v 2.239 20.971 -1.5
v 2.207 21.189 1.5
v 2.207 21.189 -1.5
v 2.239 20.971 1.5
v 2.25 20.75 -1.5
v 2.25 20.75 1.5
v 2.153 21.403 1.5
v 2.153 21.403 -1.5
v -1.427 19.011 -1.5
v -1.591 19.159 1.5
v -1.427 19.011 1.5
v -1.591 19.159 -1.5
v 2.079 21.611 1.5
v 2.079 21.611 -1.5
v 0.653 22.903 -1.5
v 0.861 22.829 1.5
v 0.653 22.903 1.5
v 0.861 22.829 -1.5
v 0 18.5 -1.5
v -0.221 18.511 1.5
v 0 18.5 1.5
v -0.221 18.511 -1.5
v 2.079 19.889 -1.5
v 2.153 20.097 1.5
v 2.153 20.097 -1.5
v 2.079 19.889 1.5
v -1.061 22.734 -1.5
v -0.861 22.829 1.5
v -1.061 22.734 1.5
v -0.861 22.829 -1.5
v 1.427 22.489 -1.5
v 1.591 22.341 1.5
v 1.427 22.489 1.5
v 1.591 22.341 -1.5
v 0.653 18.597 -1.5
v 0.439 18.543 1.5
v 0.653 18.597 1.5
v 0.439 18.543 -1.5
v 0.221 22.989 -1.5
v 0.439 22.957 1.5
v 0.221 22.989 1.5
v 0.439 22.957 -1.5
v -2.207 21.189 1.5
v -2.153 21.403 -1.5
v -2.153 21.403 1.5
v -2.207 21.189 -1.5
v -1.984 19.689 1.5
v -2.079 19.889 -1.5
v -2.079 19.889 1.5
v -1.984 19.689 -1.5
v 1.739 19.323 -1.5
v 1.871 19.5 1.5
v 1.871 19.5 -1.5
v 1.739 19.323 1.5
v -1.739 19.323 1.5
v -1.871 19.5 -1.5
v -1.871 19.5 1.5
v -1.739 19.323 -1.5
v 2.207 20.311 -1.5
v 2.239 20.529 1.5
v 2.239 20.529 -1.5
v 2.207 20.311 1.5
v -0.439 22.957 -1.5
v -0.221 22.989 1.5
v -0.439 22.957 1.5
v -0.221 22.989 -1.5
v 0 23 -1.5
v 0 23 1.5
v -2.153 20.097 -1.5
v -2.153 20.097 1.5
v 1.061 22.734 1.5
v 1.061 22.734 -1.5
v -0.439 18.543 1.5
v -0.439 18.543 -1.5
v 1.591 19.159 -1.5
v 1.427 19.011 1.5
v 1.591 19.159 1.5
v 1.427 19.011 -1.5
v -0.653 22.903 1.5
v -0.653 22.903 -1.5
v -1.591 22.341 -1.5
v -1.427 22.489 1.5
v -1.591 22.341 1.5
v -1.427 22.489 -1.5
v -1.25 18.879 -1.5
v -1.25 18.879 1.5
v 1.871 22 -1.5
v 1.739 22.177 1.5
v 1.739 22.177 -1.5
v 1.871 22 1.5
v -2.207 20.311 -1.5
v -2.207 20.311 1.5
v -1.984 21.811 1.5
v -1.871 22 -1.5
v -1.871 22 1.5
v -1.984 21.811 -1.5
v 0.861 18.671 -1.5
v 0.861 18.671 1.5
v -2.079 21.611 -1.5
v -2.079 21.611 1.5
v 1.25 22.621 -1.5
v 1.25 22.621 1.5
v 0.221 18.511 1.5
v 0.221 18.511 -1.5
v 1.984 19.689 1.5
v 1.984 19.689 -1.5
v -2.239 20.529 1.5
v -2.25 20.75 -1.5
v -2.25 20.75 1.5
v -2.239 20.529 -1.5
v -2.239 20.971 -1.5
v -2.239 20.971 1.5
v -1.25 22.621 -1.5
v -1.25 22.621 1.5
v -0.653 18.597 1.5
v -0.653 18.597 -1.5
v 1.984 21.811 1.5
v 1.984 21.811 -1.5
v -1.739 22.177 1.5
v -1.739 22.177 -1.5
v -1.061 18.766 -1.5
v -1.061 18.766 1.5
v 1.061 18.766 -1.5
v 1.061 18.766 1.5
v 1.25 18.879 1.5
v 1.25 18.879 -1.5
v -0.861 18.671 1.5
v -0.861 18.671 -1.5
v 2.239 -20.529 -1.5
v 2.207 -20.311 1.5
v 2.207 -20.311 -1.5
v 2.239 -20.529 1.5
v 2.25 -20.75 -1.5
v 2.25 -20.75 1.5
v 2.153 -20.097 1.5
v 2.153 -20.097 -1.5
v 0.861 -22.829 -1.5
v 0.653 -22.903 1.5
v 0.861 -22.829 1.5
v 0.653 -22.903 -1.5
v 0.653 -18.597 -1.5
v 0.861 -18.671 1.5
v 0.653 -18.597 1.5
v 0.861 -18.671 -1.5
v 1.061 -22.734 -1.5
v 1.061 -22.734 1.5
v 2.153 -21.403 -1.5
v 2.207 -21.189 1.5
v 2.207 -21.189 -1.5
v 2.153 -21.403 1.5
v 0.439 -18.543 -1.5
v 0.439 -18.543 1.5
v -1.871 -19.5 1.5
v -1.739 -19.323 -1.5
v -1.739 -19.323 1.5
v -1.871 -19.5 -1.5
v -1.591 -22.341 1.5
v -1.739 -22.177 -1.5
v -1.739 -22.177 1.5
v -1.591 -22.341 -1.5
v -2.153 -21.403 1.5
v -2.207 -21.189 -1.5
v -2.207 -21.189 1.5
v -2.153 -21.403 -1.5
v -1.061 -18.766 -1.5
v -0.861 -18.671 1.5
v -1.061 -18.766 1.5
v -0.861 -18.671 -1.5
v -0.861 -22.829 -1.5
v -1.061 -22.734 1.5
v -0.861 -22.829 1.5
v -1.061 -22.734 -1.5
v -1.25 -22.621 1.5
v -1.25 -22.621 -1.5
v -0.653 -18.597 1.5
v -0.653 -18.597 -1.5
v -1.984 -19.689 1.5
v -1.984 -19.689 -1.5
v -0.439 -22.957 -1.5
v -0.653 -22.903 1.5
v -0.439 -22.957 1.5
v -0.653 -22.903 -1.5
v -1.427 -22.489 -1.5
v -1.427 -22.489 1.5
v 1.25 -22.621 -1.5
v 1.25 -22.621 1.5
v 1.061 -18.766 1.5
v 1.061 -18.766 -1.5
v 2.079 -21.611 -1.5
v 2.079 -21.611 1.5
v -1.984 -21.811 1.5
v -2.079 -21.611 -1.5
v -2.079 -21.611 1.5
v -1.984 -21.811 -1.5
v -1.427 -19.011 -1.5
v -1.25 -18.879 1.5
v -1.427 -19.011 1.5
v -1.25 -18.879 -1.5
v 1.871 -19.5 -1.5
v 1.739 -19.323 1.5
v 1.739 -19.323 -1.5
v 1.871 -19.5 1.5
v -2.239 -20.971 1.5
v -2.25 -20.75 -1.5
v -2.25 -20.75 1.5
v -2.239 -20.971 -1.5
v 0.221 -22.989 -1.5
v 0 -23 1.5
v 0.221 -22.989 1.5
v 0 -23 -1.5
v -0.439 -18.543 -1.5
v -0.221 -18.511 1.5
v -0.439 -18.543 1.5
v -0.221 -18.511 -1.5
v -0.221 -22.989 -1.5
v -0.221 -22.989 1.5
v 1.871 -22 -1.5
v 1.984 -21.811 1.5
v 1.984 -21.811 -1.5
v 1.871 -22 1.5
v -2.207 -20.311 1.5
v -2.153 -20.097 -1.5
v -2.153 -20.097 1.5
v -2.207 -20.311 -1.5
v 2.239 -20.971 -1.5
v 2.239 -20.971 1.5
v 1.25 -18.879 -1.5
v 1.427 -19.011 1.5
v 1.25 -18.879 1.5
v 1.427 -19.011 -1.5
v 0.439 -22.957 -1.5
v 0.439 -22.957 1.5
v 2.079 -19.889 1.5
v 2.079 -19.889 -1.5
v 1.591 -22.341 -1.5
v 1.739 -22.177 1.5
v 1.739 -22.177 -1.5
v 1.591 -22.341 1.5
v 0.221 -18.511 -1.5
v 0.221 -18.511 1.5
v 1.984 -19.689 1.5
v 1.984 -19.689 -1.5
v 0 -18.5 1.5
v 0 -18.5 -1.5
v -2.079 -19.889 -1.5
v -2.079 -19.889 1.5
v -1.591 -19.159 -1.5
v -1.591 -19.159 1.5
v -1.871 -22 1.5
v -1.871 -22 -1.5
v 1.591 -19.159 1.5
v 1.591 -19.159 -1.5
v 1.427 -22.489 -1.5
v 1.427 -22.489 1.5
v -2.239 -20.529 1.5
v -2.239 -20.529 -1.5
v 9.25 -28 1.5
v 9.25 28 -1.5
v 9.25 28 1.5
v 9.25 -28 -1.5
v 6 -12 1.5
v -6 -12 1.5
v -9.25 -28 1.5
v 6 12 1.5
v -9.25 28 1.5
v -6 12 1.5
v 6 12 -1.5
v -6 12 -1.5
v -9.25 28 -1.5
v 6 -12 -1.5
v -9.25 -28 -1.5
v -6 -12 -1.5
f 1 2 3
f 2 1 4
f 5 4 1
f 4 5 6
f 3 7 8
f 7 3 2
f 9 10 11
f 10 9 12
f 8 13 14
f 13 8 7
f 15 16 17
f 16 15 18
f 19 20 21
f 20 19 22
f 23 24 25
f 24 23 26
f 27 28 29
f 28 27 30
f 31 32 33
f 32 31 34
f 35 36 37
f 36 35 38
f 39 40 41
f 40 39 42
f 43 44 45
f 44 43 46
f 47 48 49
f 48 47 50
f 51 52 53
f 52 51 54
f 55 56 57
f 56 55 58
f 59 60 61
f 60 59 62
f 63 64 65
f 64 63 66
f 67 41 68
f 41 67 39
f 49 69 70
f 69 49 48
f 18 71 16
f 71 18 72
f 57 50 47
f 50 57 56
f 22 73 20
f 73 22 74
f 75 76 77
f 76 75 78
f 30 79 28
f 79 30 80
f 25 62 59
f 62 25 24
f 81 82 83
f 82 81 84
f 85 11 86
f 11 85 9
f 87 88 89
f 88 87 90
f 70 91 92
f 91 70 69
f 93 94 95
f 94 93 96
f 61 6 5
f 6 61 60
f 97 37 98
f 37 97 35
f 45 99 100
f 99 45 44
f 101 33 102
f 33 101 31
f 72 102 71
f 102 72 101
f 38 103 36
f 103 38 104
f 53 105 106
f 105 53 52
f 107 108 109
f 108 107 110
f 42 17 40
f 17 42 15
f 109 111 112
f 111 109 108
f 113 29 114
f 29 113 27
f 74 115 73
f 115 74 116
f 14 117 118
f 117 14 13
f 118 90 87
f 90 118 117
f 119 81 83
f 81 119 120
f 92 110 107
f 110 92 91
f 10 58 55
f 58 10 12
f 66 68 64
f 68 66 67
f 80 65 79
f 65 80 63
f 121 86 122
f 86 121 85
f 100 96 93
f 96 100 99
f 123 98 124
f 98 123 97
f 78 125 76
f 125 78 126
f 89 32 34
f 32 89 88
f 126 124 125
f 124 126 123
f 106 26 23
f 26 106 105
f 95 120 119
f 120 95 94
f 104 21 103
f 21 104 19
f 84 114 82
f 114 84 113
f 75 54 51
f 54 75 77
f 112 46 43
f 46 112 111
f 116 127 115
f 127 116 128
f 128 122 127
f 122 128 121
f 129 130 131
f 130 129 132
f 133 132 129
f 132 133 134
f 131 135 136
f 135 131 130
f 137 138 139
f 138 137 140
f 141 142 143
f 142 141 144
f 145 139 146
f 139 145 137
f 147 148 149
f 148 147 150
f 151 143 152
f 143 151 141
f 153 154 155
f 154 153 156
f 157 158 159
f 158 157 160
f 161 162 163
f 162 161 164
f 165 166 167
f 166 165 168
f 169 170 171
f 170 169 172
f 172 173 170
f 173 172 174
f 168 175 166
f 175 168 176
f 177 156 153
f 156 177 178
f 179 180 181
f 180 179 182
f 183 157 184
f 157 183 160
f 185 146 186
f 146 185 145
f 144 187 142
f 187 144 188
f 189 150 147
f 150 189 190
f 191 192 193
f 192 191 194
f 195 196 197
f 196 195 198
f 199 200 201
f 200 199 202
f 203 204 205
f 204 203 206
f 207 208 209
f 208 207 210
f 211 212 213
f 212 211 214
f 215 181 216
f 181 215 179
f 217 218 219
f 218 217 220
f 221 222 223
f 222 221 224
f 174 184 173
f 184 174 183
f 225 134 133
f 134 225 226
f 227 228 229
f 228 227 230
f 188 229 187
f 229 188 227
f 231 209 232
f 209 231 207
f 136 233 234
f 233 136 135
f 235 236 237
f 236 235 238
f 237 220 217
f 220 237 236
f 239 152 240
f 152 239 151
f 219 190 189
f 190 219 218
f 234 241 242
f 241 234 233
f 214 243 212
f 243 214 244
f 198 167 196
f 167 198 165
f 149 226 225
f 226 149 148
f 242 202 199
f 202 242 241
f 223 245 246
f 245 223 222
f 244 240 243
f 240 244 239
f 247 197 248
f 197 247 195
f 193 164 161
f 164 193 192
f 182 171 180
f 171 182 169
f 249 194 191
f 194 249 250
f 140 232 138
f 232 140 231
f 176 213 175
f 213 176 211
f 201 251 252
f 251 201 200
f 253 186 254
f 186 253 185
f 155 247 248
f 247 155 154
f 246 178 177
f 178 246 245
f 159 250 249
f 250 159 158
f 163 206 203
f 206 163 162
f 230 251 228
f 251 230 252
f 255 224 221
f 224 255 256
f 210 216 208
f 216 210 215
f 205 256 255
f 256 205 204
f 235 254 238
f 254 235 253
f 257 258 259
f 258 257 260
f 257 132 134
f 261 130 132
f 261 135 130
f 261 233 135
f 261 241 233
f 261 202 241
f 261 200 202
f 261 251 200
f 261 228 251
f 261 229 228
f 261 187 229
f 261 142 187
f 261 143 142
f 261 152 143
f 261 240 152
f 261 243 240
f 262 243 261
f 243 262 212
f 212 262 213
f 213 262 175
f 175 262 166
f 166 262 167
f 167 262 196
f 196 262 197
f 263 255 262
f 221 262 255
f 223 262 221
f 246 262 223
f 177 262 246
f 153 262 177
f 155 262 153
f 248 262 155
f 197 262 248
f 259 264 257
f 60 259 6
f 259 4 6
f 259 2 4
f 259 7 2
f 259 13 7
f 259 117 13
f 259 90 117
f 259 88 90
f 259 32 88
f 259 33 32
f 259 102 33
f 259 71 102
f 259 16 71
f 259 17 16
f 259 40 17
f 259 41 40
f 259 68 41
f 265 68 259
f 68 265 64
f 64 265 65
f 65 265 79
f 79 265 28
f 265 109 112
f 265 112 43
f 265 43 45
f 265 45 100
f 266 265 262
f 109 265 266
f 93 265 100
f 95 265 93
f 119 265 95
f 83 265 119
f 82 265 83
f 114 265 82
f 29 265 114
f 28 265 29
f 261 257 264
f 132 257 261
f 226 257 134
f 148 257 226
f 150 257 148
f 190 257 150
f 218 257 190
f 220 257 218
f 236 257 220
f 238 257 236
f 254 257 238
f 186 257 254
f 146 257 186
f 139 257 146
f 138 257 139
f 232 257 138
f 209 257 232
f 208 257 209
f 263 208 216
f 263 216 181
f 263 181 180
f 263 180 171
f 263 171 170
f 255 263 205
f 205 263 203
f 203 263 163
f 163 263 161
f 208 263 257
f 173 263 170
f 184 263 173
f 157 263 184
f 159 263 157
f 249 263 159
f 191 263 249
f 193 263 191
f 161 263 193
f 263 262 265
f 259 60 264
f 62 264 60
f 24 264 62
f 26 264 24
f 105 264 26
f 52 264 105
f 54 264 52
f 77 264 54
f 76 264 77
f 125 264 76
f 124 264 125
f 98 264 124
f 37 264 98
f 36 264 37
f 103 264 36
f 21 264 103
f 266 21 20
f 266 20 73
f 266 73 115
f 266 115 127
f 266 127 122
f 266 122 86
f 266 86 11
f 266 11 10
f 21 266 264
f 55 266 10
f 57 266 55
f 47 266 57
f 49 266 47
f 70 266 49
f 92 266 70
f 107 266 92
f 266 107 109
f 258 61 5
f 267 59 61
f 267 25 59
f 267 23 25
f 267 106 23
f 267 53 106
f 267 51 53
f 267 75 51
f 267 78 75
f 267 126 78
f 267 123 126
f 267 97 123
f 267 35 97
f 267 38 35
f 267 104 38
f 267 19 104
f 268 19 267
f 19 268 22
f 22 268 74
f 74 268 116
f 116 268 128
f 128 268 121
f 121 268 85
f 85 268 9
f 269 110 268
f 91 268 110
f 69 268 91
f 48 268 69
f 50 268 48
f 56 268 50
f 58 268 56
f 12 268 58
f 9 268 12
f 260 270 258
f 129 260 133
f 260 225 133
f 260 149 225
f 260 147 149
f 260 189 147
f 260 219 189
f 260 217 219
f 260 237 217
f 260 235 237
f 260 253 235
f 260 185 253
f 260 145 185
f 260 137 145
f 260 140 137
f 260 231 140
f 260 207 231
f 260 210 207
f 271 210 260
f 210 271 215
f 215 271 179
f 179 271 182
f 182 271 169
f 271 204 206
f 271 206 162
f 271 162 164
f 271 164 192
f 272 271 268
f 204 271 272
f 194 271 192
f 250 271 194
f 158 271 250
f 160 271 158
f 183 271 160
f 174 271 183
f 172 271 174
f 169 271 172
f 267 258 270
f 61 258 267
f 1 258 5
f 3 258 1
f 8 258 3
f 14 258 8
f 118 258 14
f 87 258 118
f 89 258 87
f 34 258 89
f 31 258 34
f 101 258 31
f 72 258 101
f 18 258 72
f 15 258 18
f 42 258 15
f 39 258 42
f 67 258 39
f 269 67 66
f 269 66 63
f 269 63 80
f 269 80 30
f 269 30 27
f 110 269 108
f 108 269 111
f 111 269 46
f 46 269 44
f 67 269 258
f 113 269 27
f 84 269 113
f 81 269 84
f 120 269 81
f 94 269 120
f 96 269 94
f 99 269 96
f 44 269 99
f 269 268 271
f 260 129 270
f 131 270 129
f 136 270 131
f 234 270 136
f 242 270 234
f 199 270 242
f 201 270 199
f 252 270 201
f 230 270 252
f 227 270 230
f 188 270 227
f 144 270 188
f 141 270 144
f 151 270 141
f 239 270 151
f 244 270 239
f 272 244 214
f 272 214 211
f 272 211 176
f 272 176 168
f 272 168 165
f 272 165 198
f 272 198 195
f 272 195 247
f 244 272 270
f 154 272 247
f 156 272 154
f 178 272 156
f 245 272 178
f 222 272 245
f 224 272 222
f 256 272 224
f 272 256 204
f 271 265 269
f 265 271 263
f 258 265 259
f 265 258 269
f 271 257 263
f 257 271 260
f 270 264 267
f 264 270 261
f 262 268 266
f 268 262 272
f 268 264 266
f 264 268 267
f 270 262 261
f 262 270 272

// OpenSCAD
//Overall Thickness
thickness = 3; //[0.1:0.1:30]

//Outer Rectangle - Width
hull_x = 18.5; //[0.5:0.1:300]
//Outer Rectangle - Length
hull_y = 56; //[0.5:0.1:300]

//Inner Rectangle (Cut) - Width
in_x = 12; //[0.5:0.1:299]
//Inner Rectangle (Cut) - Length
in_y = 24; //[0.5:0.1:299]

//Screw Diameter
screw_dia = 4.5; //[0.5:0.1:100]
//Overall Seperation
screw_seperation = 41.5; //[0.5:0.1:280]

//Final Representation
outer_hull();


module outer_hull(){
    difference(){
        cube([hull_x, hull_y, thickness], center = true);
        cube([in_x, in_y, thickness + 1], center = true);
        placed_screws();
    }
}


module placed_screws(){
    translate([0,screw_seperation/2, 0]){
        screw_holes();
    }
    translate([0,-screw_seperation/2, 0]){
        screw_holes();
    }
}

module screw_holes(){
    cylinder(h = thickness + 1, d = screw_dia, center = true, $fn = 64);
}
